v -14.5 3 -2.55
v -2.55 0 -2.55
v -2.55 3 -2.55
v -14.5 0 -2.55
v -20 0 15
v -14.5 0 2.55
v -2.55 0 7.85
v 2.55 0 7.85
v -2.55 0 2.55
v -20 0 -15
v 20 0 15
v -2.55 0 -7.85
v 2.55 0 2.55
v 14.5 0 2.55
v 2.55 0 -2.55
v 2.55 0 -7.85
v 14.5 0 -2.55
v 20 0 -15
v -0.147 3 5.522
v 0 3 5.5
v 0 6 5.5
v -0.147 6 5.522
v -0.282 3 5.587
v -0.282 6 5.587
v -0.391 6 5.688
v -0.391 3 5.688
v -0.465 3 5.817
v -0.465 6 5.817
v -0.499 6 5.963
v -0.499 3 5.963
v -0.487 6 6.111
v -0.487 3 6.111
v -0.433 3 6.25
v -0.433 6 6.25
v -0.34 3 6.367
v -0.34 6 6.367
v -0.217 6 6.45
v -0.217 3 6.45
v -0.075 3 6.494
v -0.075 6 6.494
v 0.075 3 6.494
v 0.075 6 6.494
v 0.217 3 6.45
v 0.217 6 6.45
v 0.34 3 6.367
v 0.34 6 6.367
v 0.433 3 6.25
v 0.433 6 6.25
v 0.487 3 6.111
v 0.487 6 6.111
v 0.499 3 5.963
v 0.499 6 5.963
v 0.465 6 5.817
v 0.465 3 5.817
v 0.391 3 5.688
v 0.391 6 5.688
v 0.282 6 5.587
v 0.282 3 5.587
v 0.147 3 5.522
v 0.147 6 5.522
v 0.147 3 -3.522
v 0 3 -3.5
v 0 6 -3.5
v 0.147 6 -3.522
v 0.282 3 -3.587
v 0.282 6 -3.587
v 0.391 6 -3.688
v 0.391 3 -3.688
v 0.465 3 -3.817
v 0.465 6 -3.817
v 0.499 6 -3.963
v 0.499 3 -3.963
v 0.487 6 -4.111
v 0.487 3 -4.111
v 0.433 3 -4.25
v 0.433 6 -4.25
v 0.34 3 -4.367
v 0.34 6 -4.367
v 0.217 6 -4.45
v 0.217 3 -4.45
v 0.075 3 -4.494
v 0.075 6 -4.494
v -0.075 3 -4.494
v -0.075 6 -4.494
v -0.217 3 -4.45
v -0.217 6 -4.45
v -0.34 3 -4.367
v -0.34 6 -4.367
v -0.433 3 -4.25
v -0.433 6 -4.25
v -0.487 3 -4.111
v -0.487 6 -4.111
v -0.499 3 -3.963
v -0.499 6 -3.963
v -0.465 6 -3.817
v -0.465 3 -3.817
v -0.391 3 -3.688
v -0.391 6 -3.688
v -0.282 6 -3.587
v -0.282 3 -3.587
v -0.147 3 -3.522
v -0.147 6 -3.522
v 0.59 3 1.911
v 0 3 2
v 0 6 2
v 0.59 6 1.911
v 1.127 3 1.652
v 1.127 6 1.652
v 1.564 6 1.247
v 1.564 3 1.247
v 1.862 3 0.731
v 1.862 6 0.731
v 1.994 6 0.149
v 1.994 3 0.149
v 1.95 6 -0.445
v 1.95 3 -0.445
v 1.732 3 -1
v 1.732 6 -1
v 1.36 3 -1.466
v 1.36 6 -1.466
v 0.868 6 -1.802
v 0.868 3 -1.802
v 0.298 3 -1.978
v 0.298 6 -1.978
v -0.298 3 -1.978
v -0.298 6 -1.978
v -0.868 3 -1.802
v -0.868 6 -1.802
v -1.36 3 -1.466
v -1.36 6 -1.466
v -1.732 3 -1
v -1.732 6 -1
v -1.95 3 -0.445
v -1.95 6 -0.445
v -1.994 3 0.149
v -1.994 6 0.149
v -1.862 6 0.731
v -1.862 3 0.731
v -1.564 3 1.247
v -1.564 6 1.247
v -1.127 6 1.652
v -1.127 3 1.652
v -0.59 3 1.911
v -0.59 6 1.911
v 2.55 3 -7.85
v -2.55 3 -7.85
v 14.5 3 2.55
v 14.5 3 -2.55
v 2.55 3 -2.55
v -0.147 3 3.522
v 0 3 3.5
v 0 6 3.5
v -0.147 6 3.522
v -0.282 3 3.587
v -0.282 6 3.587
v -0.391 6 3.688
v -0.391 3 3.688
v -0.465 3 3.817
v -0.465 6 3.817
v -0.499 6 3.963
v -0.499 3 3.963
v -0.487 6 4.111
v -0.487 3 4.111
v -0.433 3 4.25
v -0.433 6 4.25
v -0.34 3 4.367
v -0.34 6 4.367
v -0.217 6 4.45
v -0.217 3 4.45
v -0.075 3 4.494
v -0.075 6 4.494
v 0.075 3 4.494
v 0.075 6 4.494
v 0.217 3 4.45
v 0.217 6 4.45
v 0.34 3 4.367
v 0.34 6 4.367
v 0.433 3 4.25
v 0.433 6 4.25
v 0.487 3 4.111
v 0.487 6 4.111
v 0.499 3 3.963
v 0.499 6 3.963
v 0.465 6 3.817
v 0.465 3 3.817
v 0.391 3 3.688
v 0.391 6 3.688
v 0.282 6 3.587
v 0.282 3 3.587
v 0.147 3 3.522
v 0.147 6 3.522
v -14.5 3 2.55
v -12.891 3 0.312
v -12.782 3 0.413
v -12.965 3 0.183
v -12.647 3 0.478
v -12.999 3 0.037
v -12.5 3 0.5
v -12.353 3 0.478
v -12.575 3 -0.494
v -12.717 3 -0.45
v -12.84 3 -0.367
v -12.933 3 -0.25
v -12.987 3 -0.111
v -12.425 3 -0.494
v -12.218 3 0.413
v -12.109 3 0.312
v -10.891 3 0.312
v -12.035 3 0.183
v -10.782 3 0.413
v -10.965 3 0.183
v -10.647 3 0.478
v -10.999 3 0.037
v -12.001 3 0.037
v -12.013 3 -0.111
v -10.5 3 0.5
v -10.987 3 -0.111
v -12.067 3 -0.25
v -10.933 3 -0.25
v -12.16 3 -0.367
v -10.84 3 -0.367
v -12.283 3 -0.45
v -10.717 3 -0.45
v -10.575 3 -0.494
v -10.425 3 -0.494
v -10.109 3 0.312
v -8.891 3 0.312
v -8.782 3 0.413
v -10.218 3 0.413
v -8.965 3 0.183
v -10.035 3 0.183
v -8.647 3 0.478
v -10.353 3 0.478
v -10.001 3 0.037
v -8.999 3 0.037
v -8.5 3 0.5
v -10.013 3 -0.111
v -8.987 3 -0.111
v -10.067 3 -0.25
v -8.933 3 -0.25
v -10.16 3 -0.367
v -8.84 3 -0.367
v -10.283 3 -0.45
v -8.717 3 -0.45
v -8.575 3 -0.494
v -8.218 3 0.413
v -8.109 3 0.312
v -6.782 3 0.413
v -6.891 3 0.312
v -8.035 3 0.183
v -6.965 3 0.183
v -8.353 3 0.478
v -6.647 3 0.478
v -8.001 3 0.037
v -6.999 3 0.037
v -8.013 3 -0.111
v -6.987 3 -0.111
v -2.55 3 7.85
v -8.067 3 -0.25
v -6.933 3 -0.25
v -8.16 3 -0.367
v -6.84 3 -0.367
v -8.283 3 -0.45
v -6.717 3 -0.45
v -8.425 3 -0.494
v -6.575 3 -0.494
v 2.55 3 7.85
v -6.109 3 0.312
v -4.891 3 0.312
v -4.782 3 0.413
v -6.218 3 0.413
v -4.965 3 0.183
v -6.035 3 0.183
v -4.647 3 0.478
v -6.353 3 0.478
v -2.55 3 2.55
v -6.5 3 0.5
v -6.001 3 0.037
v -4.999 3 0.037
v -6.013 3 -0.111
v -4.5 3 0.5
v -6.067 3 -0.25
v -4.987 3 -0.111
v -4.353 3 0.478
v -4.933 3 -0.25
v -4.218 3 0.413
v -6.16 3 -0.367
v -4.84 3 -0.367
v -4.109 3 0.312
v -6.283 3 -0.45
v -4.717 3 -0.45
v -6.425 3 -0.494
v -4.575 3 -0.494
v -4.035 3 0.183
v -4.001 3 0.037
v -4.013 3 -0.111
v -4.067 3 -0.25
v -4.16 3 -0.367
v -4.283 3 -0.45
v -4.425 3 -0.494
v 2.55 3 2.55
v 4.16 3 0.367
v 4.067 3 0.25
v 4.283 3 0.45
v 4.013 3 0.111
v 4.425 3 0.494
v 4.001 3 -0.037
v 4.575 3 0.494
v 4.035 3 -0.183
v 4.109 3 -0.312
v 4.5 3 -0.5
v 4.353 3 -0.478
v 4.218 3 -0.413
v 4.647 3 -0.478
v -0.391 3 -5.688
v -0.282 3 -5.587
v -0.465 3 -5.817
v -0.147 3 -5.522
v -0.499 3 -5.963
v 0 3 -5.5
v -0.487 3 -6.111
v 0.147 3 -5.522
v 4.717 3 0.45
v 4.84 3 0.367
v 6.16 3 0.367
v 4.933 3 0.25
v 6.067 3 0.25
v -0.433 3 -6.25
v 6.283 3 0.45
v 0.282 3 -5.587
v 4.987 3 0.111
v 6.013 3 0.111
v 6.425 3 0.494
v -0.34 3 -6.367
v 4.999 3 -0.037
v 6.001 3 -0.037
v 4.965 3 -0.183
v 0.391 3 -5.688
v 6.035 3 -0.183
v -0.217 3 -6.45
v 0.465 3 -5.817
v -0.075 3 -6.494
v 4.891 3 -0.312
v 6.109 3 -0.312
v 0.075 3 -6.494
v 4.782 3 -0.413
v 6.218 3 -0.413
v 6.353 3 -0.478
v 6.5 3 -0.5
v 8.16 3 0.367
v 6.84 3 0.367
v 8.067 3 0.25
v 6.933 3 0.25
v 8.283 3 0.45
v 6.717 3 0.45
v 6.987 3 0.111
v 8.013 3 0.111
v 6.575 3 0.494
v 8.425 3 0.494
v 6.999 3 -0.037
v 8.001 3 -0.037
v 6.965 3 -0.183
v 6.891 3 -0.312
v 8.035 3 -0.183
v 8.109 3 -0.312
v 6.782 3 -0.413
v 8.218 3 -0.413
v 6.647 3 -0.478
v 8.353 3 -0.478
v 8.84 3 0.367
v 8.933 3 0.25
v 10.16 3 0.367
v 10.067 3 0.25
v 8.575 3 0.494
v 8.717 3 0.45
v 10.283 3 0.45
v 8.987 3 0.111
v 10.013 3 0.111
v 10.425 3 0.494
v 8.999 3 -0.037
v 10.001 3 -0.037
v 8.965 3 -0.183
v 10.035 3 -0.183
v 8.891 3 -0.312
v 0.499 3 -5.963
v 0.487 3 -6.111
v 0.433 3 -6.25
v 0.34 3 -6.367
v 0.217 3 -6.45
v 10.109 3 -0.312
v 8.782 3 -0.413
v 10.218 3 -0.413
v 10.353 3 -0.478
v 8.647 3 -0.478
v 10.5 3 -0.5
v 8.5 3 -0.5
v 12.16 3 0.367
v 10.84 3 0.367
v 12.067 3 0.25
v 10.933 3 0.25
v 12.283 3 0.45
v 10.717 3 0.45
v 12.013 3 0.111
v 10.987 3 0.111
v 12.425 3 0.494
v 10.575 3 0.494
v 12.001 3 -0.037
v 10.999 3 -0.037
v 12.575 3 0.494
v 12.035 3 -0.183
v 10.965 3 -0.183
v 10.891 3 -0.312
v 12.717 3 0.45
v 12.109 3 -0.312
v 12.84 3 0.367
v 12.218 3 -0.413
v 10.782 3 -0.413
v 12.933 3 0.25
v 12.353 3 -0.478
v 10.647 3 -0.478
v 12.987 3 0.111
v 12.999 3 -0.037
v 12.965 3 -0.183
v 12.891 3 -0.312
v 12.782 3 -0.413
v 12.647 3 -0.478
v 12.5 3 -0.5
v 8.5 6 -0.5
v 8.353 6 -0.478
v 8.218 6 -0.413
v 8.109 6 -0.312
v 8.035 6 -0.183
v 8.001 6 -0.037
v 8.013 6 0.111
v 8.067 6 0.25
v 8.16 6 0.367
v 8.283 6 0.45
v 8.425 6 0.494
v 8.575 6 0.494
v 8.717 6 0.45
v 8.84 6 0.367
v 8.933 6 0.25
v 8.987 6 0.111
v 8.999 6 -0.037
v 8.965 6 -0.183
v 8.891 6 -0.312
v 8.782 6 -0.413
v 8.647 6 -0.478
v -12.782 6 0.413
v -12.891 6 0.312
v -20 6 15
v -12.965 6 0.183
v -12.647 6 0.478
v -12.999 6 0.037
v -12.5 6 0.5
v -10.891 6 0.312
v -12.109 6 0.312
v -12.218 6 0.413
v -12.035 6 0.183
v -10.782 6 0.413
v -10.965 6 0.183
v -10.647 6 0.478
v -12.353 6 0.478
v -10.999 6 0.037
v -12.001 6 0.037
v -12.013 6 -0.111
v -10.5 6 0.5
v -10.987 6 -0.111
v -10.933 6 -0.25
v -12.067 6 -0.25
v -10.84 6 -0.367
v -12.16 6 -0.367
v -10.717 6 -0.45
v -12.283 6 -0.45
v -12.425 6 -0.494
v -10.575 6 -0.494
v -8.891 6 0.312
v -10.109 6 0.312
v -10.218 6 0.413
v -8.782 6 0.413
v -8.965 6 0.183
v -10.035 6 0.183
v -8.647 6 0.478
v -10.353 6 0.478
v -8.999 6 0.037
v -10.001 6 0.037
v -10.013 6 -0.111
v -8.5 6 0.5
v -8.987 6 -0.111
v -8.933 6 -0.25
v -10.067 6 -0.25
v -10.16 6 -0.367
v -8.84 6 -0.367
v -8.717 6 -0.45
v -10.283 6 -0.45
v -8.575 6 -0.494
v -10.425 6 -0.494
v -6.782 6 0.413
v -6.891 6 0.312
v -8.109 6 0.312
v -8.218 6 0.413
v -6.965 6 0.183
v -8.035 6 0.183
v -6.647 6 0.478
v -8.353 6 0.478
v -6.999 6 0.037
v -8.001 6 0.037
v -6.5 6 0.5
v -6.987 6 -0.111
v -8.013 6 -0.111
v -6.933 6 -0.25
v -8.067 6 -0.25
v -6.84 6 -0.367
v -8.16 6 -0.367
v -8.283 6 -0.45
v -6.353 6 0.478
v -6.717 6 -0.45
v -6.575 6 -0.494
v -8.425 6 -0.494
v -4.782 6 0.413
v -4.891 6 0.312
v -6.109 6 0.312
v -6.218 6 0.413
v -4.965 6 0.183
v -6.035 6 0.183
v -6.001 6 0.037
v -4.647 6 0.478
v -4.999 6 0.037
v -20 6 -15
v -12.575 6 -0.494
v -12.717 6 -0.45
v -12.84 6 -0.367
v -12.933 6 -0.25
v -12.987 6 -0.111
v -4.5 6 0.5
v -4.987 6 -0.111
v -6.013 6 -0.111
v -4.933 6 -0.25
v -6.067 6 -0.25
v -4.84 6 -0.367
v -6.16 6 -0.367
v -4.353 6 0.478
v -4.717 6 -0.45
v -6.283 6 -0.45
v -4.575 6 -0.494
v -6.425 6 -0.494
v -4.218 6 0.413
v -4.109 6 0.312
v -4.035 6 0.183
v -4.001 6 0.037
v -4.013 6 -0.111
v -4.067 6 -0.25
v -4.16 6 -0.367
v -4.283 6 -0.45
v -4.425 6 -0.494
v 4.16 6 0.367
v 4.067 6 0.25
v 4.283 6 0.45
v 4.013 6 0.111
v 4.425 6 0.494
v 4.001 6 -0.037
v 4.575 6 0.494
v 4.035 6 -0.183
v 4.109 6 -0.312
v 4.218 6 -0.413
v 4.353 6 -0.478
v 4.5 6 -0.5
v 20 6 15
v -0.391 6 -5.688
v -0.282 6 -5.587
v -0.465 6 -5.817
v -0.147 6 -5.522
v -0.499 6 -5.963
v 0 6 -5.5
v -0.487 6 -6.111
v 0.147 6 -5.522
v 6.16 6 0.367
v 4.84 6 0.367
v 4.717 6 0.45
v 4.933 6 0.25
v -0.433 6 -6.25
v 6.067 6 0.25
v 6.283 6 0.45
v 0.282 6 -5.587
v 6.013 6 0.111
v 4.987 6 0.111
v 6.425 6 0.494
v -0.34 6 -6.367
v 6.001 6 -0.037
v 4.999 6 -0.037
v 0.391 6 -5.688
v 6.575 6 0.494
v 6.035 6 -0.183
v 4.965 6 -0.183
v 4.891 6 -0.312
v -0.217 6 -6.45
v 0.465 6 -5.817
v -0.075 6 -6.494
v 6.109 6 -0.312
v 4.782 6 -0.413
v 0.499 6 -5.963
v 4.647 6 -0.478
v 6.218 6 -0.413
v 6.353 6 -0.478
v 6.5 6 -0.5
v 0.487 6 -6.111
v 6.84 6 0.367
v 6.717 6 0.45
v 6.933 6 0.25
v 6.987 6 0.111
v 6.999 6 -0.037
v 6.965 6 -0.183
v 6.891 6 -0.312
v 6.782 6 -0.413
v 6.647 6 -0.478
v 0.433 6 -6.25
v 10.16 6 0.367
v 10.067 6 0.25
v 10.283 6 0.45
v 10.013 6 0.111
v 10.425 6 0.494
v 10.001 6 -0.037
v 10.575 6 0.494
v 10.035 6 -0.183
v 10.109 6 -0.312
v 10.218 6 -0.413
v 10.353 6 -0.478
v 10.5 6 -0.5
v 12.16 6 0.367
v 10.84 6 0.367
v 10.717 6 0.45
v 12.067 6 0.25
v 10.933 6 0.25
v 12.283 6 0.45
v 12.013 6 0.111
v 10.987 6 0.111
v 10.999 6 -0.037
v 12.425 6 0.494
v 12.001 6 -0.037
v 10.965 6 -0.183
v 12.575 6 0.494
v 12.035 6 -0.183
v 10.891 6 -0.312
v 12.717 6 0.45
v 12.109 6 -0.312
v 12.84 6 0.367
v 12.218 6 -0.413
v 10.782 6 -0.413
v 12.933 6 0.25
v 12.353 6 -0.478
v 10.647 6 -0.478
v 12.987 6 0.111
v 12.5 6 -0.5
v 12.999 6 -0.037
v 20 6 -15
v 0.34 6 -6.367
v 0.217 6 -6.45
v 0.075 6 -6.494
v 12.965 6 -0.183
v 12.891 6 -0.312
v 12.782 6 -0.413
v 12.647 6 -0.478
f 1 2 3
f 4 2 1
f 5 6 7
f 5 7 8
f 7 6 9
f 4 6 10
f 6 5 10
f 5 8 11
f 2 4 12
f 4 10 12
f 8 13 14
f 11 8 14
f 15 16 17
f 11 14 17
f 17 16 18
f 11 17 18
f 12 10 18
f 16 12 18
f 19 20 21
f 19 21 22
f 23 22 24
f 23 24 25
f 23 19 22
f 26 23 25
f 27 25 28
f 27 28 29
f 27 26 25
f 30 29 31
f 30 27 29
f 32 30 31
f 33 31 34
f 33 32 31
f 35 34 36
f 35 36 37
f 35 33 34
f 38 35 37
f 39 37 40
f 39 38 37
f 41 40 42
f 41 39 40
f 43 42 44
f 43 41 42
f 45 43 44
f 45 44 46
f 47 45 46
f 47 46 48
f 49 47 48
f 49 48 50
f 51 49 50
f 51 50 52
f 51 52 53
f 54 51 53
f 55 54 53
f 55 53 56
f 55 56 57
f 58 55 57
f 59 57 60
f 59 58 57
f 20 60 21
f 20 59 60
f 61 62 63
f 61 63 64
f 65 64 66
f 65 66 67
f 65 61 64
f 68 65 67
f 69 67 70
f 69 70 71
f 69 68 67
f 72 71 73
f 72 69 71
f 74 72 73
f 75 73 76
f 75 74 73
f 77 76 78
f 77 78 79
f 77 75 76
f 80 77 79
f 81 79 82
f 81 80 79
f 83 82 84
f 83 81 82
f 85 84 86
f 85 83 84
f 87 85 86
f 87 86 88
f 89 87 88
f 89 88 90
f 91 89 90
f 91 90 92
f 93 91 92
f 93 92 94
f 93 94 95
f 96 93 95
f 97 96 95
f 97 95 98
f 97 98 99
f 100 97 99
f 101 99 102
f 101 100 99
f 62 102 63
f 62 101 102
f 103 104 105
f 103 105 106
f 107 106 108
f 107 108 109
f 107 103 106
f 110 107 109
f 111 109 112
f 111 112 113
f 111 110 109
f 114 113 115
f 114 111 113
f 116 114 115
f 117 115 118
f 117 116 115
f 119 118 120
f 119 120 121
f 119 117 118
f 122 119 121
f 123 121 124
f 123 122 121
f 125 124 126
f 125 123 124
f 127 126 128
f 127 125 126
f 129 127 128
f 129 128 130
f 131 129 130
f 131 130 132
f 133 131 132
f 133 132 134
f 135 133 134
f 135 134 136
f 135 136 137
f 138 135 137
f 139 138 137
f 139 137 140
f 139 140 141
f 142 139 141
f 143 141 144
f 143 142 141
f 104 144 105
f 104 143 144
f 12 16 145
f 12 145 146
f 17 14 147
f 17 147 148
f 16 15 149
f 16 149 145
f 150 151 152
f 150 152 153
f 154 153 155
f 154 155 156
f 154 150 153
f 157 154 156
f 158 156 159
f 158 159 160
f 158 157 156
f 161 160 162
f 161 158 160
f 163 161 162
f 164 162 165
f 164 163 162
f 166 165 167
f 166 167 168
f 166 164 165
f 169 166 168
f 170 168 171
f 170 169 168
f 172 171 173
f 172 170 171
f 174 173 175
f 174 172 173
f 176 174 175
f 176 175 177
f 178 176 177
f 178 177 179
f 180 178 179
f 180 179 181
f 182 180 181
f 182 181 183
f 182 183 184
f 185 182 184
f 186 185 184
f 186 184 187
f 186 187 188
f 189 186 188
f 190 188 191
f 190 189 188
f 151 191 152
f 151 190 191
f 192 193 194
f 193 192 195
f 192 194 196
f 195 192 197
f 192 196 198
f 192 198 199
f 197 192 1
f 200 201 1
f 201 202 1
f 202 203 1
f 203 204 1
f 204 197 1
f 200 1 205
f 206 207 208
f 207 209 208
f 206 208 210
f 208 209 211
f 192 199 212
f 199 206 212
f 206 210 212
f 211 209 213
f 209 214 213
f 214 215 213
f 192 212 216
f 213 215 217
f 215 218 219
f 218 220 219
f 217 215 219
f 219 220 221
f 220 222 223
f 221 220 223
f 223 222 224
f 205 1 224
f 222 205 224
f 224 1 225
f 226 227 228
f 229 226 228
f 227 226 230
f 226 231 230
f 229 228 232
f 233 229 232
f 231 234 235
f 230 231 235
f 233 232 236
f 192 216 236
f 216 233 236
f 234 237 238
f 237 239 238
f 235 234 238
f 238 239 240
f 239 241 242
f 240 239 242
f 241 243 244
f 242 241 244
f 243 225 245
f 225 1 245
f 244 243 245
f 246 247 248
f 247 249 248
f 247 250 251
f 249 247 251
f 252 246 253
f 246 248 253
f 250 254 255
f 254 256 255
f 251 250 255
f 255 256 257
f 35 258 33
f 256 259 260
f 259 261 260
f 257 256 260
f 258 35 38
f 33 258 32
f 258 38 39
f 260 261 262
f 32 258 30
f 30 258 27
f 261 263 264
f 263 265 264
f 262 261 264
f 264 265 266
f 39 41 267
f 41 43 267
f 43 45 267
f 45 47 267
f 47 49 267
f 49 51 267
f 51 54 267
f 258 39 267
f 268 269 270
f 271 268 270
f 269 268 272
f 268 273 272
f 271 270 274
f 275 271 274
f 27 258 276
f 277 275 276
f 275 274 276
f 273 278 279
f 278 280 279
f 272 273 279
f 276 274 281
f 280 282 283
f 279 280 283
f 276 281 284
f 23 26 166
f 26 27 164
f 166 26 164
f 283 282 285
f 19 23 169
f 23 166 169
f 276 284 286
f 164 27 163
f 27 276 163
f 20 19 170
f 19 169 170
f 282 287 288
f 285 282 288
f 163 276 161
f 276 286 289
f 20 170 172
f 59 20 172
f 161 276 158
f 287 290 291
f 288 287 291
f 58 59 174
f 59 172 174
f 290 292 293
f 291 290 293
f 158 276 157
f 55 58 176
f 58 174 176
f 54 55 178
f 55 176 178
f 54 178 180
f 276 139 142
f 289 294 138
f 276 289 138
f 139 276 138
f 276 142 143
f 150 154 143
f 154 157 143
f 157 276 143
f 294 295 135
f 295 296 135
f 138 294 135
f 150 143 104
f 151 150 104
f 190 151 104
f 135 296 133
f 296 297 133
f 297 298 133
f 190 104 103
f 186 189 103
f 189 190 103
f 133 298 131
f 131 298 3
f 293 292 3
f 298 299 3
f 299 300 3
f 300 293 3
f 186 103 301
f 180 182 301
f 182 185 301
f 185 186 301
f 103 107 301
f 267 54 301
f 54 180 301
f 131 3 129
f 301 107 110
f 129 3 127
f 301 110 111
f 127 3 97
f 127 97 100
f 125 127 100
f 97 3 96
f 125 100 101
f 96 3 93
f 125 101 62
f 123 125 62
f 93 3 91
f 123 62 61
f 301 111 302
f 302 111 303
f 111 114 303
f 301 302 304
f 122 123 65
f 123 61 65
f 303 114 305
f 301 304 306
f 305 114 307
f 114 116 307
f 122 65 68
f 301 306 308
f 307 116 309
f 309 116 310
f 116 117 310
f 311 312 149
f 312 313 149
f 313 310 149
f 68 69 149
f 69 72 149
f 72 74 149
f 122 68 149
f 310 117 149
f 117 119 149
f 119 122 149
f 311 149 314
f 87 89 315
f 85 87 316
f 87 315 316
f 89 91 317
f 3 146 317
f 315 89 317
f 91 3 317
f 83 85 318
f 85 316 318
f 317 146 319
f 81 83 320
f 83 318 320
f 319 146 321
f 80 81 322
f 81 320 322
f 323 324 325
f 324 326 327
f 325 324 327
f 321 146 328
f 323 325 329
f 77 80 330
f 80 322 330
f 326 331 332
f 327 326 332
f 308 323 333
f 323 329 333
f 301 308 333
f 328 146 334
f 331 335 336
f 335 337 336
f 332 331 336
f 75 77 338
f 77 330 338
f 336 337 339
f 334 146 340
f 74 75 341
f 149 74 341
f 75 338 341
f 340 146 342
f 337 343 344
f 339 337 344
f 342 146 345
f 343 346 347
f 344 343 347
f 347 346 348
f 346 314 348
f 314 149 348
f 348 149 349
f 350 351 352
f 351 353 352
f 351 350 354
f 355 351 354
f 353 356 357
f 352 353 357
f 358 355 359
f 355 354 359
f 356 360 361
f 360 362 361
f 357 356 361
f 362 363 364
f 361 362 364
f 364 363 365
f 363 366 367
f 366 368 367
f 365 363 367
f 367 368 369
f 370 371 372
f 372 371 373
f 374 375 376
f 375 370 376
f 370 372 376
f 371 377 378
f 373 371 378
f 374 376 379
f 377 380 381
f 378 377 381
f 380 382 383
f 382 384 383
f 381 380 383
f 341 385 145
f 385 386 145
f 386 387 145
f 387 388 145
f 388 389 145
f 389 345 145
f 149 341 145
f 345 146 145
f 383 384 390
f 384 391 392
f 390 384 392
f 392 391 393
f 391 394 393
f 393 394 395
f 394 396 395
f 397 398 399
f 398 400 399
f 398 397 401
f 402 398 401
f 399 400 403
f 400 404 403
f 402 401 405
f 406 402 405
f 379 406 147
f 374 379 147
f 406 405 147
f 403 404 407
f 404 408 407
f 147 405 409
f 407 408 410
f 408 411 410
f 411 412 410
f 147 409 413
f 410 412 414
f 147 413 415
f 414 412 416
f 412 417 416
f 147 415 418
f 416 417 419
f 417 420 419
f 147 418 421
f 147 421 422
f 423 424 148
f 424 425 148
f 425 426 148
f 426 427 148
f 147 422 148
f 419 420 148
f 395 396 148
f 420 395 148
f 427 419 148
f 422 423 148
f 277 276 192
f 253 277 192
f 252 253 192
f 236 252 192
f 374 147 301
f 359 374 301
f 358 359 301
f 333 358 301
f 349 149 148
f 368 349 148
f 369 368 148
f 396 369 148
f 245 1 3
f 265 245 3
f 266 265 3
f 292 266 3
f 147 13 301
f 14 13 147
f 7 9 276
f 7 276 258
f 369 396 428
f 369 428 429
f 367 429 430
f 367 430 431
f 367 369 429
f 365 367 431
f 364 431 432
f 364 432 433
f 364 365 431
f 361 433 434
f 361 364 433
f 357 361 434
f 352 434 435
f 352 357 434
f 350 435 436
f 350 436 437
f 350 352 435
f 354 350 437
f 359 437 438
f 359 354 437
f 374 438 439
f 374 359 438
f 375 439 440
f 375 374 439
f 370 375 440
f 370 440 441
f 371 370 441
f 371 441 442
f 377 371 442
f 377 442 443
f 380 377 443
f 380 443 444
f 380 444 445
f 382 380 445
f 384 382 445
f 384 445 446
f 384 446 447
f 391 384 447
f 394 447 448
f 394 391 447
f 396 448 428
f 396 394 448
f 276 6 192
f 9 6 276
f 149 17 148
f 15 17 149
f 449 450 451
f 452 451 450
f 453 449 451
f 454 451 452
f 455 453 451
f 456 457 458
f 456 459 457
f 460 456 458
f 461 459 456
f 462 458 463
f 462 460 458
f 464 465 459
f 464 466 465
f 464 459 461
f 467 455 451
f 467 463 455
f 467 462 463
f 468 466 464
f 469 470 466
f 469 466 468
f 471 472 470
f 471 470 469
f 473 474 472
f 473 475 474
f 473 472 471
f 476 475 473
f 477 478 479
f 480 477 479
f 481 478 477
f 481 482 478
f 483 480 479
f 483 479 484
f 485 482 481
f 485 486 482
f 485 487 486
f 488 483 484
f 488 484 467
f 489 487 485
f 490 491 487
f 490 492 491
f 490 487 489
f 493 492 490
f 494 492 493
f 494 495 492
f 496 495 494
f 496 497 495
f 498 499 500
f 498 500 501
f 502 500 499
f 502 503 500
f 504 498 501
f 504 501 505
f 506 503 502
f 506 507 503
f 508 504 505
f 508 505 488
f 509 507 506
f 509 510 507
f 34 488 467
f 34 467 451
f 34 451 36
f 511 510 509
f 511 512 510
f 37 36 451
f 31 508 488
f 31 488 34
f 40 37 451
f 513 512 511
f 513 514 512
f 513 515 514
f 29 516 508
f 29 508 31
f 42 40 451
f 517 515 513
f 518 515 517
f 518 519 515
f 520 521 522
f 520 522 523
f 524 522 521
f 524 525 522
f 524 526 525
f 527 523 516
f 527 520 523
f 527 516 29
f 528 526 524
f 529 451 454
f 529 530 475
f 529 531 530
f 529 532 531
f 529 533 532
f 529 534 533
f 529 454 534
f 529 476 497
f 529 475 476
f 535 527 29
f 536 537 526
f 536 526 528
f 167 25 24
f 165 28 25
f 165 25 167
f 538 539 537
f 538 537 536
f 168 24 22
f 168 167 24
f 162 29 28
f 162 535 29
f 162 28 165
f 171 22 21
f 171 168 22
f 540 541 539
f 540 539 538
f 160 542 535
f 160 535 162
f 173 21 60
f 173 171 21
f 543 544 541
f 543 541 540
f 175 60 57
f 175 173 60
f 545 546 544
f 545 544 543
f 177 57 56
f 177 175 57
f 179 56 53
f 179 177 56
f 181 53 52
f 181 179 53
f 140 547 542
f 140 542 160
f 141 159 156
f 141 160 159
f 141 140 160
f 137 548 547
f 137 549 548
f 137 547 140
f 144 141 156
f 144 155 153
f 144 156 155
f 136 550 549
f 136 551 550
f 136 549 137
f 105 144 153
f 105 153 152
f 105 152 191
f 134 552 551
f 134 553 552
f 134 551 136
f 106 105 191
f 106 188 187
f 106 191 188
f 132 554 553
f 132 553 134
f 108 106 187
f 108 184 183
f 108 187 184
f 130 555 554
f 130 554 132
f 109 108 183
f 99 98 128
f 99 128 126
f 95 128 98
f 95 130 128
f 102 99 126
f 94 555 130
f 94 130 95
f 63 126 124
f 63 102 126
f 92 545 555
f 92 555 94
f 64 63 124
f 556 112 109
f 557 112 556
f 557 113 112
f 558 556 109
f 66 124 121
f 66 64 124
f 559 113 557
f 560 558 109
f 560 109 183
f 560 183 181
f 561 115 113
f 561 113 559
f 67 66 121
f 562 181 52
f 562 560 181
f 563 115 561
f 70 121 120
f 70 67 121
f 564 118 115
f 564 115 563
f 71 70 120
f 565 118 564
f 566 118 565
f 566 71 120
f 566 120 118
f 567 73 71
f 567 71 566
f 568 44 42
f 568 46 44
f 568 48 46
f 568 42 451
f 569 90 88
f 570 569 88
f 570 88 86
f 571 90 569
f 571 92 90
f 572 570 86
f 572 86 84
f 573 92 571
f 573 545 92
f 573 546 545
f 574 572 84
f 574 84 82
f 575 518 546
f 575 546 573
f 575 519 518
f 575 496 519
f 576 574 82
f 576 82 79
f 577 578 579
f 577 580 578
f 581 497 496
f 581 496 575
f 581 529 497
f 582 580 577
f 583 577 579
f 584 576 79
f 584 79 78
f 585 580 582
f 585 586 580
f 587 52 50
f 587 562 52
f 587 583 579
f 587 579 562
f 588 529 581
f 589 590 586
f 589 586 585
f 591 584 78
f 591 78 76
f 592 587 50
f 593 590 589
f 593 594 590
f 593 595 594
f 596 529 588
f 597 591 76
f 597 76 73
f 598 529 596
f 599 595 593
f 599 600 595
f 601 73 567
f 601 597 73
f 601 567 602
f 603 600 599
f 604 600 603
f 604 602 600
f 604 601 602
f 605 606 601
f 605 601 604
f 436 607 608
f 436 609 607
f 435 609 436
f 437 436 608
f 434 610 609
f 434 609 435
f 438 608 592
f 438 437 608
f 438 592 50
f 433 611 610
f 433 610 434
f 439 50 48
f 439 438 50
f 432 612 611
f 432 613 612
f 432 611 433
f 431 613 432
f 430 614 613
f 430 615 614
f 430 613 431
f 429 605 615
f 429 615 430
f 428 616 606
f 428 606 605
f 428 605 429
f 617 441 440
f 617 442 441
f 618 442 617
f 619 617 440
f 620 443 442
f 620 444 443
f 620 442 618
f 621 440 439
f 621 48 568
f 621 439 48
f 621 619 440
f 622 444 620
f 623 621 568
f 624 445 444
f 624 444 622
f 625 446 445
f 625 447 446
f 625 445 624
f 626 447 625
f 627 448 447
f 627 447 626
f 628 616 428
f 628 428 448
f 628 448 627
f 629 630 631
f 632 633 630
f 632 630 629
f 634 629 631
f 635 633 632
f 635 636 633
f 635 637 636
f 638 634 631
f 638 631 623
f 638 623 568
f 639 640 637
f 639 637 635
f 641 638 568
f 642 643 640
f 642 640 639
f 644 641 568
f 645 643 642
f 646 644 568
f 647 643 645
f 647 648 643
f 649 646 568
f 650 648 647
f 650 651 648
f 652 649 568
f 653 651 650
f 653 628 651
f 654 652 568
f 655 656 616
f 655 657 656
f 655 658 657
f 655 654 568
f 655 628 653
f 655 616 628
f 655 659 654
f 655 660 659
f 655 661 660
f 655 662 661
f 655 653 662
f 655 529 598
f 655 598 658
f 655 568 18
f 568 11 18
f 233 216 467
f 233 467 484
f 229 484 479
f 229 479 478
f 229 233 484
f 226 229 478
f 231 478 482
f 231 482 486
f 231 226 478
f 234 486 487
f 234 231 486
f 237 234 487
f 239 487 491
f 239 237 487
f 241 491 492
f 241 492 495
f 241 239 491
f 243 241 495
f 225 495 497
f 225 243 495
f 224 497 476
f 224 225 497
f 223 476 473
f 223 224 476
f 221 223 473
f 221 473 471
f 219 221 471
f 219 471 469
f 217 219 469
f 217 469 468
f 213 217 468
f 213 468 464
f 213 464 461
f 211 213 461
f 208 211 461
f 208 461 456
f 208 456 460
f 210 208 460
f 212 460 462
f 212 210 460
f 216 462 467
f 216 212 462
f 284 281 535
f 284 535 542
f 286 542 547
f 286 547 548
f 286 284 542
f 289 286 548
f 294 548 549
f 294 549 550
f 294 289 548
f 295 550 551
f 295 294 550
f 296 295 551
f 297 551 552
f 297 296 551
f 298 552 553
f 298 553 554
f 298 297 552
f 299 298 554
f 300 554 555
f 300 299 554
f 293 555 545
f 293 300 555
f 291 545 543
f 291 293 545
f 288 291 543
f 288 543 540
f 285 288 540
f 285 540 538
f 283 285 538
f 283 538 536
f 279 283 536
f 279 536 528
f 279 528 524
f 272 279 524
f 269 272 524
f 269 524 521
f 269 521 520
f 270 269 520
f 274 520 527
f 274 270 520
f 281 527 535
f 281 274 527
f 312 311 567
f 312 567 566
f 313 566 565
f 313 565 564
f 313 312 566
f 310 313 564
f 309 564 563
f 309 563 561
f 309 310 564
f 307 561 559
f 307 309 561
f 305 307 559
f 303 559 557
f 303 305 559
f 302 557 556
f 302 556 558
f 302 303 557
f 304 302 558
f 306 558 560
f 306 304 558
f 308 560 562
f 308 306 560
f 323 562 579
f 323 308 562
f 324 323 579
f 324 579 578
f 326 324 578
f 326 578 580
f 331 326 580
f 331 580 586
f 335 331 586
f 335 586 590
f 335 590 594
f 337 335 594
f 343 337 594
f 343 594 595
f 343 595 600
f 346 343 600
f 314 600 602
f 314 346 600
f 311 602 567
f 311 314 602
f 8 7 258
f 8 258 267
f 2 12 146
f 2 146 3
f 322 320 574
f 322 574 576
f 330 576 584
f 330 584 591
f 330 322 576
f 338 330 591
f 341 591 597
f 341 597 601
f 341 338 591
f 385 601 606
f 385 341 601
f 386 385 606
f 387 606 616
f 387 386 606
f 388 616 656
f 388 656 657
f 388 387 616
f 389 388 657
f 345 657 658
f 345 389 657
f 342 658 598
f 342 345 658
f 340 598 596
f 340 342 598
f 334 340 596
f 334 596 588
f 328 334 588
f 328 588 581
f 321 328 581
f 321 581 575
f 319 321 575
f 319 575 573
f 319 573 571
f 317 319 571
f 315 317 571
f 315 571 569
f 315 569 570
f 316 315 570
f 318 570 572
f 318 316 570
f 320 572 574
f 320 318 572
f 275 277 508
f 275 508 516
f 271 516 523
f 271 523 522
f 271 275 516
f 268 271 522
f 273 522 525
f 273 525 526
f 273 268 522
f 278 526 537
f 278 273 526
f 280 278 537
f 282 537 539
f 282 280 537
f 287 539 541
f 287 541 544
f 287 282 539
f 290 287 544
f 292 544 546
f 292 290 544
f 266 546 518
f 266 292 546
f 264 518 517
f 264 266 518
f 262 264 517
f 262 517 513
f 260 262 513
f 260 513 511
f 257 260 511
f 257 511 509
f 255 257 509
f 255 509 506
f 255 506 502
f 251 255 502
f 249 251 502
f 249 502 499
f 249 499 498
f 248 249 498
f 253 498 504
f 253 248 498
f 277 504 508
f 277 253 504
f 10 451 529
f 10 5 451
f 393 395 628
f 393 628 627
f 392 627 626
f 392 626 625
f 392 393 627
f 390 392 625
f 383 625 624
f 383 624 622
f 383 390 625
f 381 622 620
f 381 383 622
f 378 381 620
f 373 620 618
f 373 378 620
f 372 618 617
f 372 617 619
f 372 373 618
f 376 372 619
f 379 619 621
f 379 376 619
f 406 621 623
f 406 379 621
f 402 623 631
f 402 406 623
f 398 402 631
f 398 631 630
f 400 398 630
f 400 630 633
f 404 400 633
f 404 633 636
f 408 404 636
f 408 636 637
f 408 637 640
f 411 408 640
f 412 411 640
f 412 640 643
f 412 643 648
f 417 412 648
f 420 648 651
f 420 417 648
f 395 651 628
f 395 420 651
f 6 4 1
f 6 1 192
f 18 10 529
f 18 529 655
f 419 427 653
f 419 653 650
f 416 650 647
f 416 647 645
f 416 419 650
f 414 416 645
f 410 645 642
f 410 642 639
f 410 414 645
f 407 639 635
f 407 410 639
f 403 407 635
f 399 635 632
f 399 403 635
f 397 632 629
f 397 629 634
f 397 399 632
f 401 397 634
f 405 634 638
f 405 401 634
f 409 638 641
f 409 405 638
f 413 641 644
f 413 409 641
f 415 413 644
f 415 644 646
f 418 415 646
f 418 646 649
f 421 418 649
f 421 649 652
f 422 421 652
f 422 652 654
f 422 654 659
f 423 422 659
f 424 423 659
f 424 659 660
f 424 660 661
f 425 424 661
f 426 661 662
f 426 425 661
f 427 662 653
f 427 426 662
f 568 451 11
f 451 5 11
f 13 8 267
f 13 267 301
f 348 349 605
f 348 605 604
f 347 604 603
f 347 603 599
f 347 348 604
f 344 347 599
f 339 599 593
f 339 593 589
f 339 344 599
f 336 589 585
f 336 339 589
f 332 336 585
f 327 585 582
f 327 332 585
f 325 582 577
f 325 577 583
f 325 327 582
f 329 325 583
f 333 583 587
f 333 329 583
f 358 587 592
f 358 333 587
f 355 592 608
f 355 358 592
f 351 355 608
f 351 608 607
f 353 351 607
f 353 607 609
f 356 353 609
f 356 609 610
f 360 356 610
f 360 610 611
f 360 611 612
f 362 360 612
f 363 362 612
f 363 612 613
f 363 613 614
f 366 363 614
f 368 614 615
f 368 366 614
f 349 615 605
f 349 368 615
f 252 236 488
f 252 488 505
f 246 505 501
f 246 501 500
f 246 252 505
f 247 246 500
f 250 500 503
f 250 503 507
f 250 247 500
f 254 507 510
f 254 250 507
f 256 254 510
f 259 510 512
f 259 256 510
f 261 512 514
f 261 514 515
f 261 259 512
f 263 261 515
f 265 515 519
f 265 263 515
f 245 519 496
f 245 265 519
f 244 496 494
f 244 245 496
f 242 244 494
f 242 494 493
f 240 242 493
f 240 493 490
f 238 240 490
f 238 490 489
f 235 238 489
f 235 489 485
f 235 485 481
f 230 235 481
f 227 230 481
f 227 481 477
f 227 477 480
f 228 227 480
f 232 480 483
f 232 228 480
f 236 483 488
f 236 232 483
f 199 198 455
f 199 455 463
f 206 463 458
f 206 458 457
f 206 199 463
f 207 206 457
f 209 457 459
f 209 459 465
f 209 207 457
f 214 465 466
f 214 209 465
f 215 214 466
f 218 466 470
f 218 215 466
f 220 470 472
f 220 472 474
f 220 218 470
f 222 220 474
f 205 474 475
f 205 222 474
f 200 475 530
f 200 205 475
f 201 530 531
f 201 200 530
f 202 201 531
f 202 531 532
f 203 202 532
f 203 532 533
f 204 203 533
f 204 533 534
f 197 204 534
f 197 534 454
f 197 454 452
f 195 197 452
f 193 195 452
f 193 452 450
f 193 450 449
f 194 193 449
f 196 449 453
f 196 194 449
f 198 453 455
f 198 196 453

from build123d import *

# Parameters (mm, degrees)
SKETCH1_W           = 40
SKETCH1_H           = 30
BOSS_EXTRUDE1_DEPTH = 3
SKETCH2_W           = 40
SKETCH2_H           = 30
SKETCH2_R           = 2
SKETCH2_R_2         = 0.5
BOSS_EXTRUDE2_DEPTH = 3


with BuildPart() as part:
    # Sketch1 → Boss-Extrude1 (new body)
    with BuildSketch(Plane(origin=(0, 0, 0), x_dir=(1, 0, 0), z_dir=(0, 1, 0))):
        Rectangle(SKETCH1_W, SKETCH1_H)
        Polygon((-2.55, -2.55), (-2.55, -7.85), (2.55, -7.85), (2.55, -2.55), (14.5, -2.55), (14.5, 2.55), (2.55, 2.55), (2.55, 7.85), (-2.55, 7.85), (-2.55, 2.55), (-14.5, 2.55), (-14.5, -2.55), align=None, mode=Mode.SUBTRACT)
    extrude(amount=BOSS_EXTRUDE1_DEPTH)

    # Sketch2 → Boss-Extrude2 (add)
    with BuildSketch(Plane(origin=(0, 3, 0), x_dir=(1, 0, 0), z_dir=(0, 1, 0))):
        Rectangle(SKETCH2_W, SKETCH2_H)
        with Locations(Location((0, 0, 0), (0, 0, 270))):
            Circle(SKETCH2_R, mode=Mode.SUBTRACT)
        with Locations(Location((-4.5, 0, 0), (0, 0, 270))):
            Circle(SKETCH2_R_2, mode=Mode.SUBTRACT)
        with Locations(Location((-6.5, 0, 0), (0, 0, 270))):
            Circle(SKETCH2_R_2, mode=Mode.SUBTRACT)
        with Locations(Location((-8.5, 0, 0), (0, 0, 270))):
            Circle(SKETCH2_R_2, mode=Mode.SUBTRACT)
        with Locations(Location((-10.5, 0, 0), (0, 0, 270))):
            Circle(SKETCH2_R_2, mode=Mode.SUBTRACT)
        with Locations(Location((-12.5, 0, 0), (0, 0, 270))):
            Circle(SKETCH2_R_2, mode=Mode.SUBTRACT)
        with Locations(Location((0, 4, 0), (0, 0, 270))):
            Circle(SKETCH2_R_2, mode=Mode.SUBTRACT)
        with Locations(Location((0, 6, 0), (0, 0, 270))):
            Circle(SKETCH2_R_2, mode=Mode.SUBTRACT)
        with Locations(Location((12.5, 0, 0), (0, 0, 90))):
            Circle(SKETCH2_R_2, mode=Mode.SUBTRACT)
        with Locations(Location((10.5, 0, 0), (0, 0, 90))):
            Circle(SKETCH2_R_2, mode=Mode.SUBTRACT)
        with Locations(Location((8.5, 0, 0), (0, 0, 90))):
            Circle(SKETCH2_R_2, mode=Mode.SUBTRACT)
        with Locations(Location((6.5, 0, 0), (0, 0, 90))):
            Circle(SKETCH2_R_2, mode=Mode.SUBTRACT)
        with Locations(Location((4.5, 0, 0), (0, 0, 90))):
            Circle(SKETCH2_R_2, mode=Mode.SUBTRACT)
        with Locations(Location((0, -4, 0), (0, 0, 90))):
            Circle(SKETCH2_R_2, mode=Mode.SUBTRACT)
        with Locations(Location((0, -6, 0), (0, 0, 90))):
            Circle(SKETCH2_R_2, mode=Mode.SUBTRACT)
    extrude(amount=BOSS_EXTRUDE2_DEPTH)


solid = part.part
